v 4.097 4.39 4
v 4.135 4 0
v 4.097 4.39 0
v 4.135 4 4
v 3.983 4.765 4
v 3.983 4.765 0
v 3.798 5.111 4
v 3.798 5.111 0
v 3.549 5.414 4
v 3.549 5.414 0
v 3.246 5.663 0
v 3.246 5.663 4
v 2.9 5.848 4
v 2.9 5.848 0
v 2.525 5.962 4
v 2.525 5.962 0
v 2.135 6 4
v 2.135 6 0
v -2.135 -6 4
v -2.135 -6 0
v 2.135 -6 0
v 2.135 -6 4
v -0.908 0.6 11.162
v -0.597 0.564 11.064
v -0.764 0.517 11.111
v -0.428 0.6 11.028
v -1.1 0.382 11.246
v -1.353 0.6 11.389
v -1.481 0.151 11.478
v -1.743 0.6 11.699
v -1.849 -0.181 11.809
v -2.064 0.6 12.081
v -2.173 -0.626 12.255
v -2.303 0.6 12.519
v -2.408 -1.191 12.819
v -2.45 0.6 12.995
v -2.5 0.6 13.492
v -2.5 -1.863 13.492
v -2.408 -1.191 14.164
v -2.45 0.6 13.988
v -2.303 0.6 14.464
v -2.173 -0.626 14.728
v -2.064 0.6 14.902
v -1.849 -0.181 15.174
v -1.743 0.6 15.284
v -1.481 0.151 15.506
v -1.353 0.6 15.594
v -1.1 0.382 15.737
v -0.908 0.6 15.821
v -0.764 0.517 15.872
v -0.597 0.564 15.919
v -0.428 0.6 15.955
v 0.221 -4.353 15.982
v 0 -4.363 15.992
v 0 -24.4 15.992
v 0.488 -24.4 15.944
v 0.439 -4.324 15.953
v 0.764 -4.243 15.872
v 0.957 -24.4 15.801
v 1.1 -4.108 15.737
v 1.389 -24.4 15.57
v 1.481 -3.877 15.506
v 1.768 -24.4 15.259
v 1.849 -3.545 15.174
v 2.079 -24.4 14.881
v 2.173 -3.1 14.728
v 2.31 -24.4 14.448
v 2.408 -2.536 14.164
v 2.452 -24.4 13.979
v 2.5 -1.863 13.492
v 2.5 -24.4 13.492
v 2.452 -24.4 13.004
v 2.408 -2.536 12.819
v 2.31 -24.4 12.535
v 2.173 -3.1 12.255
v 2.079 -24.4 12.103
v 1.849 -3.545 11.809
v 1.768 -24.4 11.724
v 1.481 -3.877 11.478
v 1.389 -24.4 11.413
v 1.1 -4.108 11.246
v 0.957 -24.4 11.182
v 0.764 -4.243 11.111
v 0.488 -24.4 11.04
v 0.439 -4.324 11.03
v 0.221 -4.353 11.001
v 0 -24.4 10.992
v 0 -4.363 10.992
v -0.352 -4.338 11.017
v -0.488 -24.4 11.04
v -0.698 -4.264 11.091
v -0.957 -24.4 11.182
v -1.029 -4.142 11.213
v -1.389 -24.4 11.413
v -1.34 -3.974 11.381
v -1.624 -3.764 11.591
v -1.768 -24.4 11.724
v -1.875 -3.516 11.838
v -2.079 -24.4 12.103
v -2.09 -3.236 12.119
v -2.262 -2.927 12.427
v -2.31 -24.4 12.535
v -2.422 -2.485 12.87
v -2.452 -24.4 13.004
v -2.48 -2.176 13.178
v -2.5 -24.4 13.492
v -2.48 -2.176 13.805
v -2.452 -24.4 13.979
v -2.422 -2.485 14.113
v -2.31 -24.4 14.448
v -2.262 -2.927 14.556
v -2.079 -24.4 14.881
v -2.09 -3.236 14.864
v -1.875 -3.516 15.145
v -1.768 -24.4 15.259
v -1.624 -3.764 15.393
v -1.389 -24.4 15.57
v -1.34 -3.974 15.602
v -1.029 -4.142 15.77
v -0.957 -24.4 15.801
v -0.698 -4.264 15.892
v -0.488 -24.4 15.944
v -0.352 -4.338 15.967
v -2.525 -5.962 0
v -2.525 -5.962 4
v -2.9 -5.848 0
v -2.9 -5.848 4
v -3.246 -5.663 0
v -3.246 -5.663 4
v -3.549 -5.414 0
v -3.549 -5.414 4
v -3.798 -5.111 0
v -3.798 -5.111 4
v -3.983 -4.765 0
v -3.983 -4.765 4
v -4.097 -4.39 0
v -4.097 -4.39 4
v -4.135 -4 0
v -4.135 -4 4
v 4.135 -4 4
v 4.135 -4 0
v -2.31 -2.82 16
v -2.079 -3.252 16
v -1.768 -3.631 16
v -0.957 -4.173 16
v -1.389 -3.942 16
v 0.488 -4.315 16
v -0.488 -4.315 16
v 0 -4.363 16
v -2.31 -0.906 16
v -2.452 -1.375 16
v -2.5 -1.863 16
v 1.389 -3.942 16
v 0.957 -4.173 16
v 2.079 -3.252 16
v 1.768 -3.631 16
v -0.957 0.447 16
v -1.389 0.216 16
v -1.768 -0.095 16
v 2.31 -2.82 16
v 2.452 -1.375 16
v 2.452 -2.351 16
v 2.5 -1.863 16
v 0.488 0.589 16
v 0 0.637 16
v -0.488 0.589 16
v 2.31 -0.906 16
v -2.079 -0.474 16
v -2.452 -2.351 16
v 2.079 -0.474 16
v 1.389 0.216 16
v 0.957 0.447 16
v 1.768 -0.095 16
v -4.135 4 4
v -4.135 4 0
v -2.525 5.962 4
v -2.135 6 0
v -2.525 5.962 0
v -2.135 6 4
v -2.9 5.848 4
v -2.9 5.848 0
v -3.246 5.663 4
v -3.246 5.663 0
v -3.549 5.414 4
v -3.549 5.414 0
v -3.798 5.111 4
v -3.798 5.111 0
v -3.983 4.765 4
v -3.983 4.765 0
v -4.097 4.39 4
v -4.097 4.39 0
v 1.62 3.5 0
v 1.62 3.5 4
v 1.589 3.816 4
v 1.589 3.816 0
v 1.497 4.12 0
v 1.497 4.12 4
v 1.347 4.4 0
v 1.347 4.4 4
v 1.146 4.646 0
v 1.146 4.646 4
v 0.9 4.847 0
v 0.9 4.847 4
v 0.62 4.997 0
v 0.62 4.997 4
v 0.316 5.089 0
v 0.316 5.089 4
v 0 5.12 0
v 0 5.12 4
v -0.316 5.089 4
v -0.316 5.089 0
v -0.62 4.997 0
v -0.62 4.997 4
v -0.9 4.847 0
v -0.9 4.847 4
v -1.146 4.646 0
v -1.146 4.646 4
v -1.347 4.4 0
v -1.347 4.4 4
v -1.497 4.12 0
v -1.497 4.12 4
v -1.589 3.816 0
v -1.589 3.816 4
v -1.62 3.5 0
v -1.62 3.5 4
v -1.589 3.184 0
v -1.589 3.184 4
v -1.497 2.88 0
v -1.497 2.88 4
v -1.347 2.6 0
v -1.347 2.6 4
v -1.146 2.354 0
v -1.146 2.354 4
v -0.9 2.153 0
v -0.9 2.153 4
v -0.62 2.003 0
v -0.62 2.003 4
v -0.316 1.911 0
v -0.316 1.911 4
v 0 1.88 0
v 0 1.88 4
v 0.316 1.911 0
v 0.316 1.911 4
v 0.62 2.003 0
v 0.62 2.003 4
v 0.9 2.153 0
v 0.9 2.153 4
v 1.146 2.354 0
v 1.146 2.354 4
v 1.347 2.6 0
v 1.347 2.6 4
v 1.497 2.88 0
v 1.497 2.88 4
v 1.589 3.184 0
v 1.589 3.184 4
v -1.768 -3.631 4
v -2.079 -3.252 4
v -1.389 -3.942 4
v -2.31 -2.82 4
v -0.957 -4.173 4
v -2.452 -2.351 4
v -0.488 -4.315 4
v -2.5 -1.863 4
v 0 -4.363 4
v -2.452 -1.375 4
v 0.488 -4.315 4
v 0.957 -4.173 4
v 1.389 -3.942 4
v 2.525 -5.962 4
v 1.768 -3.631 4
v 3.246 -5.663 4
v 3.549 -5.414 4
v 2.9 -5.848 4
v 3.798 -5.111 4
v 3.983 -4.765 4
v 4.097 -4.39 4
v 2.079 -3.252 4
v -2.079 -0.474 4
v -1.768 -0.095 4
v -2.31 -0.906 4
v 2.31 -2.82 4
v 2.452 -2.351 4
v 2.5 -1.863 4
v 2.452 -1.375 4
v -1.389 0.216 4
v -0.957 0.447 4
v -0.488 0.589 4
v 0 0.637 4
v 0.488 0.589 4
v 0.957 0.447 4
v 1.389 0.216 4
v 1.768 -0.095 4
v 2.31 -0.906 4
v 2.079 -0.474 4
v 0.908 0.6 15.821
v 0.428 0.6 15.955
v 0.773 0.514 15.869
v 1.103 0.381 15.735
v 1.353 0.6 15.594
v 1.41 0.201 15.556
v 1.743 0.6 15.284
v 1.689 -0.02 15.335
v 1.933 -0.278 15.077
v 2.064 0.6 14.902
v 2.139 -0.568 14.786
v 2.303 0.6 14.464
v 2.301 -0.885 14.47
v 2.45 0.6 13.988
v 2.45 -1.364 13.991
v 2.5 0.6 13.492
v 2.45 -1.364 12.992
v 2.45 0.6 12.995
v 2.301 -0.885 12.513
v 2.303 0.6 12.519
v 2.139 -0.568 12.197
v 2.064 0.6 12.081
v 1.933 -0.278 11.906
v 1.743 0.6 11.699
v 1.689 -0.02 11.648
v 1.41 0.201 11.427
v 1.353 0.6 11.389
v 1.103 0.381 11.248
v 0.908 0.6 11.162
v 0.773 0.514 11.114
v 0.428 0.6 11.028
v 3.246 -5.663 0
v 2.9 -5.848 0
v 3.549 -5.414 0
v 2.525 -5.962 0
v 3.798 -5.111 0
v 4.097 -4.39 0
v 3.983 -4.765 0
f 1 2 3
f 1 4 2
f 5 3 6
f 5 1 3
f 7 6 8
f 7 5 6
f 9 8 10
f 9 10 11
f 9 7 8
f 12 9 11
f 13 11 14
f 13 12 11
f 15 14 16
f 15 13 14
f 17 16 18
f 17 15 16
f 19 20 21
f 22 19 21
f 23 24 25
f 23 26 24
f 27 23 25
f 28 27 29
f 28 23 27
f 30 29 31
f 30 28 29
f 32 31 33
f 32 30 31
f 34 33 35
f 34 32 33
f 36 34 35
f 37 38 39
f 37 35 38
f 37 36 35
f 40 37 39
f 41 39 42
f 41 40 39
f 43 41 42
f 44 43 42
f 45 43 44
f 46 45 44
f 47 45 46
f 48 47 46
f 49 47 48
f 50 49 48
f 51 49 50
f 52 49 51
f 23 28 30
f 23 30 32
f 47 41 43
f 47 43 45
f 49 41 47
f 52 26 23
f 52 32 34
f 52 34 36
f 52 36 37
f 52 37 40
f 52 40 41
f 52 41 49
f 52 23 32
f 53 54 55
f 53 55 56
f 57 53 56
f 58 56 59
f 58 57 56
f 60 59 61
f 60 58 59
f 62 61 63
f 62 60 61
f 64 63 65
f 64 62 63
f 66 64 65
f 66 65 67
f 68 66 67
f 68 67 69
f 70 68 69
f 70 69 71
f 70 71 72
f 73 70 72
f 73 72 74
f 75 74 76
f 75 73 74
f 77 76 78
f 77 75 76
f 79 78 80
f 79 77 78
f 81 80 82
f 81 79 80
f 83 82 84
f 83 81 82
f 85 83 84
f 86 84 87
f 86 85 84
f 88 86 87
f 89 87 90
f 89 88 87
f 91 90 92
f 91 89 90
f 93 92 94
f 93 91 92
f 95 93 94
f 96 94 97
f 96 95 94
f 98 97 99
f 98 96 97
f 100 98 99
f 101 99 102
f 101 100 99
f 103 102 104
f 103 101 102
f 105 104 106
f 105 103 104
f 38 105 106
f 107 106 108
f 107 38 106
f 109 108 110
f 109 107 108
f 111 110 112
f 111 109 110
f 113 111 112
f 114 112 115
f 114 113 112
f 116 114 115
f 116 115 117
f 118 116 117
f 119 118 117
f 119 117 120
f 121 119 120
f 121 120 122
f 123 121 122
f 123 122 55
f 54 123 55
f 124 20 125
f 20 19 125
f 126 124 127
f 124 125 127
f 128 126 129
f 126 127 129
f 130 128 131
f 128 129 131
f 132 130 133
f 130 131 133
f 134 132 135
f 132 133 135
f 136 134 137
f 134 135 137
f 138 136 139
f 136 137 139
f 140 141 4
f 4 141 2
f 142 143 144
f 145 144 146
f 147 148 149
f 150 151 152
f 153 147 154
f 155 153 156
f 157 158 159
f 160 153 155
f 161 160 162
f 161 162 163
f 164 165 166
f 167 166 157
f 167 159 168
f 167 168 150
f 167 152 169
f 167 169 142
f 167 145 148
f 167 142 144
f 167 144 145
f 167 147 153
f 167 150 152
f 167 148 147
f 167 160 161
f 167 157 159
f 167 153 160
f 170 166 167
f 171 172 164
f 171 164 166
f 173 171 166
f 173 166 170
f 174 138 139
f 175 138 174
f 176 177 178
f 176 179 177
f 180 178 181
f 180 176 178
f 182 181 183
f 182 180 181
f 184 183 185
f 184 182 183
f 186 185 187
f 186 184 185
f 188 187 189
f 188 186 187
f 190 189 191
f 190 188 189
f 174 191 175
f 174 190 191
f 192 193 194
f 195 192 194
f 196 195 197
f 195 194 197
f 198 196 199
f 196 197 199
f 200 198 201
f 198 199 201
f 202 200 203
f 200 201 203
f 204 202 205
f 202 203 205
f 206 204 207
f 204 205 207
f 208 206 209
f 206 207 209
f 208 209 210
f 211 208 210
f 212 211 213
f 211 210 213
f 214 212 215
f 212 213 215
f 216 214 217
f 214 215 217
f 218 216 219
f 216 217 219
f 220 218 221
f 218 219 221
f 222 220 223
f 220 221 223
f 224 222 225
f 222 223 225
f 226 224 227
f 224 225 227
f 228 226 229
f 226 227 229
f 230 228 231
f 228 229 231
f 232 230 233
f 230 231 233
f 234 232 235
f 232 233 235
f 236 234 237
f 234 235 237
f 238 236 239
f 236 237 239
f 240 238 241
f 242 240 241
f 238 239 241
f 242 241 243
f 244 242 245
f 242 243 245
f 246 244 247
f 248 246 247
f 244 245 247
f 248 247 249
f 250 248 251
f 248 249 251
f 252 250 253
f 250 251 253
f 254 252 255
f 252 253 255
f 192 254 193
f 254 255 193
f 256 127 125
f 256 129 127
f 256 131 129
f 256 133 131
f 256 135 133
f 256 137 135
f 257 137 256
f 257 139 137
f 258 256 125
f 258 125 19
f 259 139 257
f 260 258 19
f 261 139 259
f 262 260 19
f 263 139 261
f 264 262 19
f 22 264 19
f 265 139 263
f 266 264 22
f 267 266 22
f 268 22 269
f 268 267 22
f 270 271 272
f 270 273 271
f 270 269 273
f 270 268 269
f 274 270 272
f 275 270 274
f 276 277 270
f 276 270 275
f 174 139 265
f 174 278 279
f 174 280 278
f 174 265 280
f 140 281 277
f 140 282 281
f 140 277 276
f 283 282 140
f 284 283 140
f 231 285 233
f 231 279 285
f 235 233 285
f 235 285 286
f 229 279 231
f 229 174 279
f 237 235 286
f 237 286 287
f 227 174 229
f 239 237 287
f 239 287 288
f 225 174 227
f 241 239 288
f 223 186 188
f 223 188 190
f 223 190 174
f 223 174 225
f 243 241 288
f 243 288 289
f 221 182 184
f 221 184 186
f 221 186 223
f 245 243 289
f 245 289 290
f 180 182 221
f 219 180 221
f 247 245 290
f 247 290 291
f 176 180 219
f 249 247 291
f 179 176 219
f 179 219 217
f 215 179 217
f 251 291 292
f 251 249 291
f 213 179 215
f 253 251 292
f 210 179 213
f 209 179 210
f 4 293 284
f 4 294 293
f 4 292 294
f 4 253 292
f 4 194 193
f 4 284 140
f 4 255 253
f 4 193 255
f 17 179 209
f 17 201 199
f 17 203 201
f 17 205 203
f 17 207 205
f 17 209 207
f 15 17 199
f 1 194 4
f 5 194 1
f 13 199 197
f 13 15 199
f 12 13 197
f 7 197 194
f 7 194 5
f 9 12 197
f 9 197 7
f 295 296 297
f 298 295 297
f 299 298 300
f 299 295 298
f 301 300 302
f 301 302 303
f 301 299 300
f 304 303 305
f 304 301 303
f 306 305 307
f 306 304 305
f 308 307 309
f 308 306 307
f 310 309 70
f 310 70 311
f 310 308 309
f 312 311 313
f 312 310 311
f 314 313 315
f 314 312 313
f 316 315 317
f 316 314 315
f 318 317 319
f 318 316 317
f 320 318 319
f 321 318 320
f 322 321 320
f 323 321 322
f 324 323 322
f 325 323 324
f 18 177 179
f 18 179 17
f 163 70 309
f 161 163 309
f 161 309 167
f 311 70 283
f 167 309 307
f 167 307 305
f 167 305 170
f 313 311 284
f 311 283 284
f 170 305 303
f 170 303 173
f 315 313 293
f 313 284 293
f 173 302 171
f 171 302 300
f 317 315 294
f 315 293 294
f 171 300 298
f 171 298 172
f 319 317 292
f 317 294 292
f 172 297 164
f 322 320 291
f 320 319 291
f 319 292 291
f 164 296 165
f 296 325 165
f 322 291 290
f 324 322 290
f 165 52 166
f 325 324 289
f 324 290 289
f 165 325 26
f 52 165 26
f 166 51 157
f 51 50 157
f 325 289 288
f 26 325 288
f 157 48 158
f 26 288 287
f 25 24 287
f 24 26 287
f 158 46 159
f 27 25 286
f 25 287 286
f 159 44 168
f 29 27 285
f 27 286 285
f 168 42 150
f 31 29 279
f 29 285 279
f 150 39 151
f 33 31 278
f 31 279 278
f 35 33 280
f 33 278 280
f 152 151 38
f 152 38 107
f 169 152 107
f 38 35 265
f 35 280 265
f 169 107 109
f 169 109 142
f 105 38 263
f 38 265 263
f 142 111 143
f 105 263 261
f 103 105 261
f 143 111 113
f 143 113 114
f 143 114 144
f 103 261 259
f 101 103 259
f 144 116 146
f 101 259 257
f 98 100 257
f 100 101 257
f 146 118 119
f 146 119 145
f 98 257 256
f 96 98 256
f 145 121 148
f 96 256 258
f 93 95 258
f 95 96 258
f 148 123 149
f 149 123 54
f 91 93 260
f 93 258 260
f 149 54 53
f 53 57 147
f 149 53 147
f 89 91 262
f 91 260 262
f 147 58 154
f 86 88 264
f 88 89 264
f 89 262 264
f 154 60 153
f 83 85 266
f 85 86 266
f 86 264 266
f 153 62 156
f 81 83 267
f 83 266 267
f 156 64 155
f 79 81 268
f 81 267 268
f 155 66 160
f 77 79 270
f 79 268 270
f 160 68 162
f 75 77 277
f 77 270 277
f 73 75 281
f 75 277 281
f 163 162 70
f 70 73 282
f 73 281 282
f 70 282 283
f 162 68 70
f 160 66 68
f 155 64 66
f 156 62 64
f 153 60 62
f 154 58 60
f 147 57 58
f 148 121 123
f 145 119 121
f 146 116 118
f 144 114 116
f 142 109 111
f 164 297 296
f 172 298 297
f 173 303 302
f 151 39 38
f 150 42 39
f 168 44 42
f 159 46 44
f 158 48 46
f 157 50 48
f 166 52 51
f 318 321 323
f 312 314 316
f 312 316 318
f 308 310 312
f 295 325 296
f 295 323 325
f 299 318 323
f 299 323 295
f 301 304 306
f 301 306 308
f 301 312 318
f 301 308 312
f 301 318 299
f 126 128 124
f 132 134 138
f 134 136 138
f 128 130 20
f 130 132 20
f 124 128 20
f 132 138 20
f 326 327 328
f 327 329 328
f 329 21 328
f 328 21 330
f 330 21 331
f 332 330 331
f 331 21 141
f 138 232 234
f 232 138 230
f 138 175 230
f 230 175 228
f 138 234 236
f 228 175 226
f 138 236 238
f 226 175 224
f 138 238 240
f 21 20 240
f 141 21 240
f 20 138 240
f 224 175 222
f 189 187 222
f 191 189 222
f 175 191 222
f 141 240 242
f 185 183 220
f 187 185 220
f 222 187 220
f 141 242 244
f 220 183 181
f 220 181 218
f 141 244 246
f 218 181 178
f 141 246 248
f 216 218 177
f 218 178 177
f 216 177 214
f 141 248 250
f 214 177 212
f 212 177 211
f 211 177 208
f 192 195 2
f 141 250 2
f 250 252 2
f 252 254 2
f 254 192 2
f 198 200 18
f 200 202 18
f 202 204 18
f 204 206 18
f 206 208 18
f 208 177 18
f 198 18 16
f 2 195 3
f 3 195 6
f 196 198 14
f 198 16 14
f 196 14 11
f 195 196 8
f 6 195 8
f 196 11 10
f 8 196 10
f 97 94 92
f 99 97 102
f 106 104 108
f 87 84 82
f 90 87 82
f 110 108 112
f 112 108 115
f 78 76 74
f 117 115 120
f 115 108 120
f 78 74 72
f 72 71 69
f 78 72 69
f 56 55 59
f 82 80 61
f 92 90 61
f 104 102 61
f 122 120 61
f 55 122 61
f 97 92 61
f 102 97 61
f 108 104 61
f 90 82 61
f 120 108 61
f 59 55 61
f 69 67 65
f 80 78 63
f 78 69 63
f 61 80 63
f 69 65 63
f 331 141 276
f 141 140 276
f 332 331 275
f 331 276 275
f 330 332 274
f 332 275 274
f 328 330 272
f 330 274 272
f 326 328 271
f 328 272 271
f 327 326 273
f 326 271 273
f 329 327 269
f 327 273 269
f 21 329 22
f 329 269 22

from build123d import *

# Parameters (mm, degrees)
SCHIZZO1_W                   = 8.27
SCHIZZO1_H                   = 12
ESTRUSIONE_ESTRUSIONE1_DEPTH = 4
RACCORDO1_R                  = 2
RACCORDO2_R                  = 2
SCHIZZO3_R                   = 1.62
TAGLIO_ESTRUSIONE1_DEPTH     = 4
SCHIZZO4_R                   = 2.5
ESTRUSIONE_ESTRUSIONE2_DEPTH = 12
SCHIZZO5_R                   = 2.5
ESTRUSIONE_ESTRUSIONE3_DEPTH = 25


with BuildPart() as part:
    # Schizzo1 → Estrusione-Estrusione1 (new body)
    with BuildSketch(Plane.XY):
        Rectangle(SCHIZZO1_W, SCHIZZO1_H)
    extrude(amount=ESTRUSIONE_ESTRUSIONE1_DEPTH)

    # Raccordo1
    raccordo1_edges = [part.edges().sort_by_distance(p)[0] for p in [
        (4.135, 6, 2),
    ]]
    fillet(raccordo1_edges, radius=RACCORDO1_R)

    # Raccordo2
    raccordo2_edges = [part.edges().sort_by_distance(p)[0] for p in [
        (4.135, -6, 2),
        (-4.135, -6, 2),
        (-4.135, 6, 2),
    ]]
    fillet(raccordo2_edges, radius=RACCORDO2_R)

    # Schizzo3 → Taglio-Estrusione1 (cut)
    with BuildSketch(Plane.XY.offset(4)):
        with Locations((0, 3.5)):
            Circle(SCHIZZO3_R)
    extrude(amount=-TAGLIO_ESTRUSIONE1_DEPTH, mode=Mode.SUBTRACT)

    # Schizzo4 → Estrusione-Estrusione2 (add)
    with BuildSketch(Plane.XY.offset(4)):
        with Locations((0, -1.86312089)):
            Circle(SCHIZZO4_R)
    extrude(amount=ESTRUSIONE_ESTRUSIONE2_DEPTH)

    # Schizzo5 → Estrusione-Estrusione3 (add)
    with BuildSketch(Plane(origin=(0, 0.6, 0), x_dir=(1, 0, 0), z_dir=(0, 1, 0))):
        with Locations(Location((0, -13.4915802, 0), (0, 0, 270))):
            Circle(SCHIZZO5_R)
    extrude(amount=-ESTRUSIONE_ESTRUSIONE3_DEPTH)


solid = part.part
